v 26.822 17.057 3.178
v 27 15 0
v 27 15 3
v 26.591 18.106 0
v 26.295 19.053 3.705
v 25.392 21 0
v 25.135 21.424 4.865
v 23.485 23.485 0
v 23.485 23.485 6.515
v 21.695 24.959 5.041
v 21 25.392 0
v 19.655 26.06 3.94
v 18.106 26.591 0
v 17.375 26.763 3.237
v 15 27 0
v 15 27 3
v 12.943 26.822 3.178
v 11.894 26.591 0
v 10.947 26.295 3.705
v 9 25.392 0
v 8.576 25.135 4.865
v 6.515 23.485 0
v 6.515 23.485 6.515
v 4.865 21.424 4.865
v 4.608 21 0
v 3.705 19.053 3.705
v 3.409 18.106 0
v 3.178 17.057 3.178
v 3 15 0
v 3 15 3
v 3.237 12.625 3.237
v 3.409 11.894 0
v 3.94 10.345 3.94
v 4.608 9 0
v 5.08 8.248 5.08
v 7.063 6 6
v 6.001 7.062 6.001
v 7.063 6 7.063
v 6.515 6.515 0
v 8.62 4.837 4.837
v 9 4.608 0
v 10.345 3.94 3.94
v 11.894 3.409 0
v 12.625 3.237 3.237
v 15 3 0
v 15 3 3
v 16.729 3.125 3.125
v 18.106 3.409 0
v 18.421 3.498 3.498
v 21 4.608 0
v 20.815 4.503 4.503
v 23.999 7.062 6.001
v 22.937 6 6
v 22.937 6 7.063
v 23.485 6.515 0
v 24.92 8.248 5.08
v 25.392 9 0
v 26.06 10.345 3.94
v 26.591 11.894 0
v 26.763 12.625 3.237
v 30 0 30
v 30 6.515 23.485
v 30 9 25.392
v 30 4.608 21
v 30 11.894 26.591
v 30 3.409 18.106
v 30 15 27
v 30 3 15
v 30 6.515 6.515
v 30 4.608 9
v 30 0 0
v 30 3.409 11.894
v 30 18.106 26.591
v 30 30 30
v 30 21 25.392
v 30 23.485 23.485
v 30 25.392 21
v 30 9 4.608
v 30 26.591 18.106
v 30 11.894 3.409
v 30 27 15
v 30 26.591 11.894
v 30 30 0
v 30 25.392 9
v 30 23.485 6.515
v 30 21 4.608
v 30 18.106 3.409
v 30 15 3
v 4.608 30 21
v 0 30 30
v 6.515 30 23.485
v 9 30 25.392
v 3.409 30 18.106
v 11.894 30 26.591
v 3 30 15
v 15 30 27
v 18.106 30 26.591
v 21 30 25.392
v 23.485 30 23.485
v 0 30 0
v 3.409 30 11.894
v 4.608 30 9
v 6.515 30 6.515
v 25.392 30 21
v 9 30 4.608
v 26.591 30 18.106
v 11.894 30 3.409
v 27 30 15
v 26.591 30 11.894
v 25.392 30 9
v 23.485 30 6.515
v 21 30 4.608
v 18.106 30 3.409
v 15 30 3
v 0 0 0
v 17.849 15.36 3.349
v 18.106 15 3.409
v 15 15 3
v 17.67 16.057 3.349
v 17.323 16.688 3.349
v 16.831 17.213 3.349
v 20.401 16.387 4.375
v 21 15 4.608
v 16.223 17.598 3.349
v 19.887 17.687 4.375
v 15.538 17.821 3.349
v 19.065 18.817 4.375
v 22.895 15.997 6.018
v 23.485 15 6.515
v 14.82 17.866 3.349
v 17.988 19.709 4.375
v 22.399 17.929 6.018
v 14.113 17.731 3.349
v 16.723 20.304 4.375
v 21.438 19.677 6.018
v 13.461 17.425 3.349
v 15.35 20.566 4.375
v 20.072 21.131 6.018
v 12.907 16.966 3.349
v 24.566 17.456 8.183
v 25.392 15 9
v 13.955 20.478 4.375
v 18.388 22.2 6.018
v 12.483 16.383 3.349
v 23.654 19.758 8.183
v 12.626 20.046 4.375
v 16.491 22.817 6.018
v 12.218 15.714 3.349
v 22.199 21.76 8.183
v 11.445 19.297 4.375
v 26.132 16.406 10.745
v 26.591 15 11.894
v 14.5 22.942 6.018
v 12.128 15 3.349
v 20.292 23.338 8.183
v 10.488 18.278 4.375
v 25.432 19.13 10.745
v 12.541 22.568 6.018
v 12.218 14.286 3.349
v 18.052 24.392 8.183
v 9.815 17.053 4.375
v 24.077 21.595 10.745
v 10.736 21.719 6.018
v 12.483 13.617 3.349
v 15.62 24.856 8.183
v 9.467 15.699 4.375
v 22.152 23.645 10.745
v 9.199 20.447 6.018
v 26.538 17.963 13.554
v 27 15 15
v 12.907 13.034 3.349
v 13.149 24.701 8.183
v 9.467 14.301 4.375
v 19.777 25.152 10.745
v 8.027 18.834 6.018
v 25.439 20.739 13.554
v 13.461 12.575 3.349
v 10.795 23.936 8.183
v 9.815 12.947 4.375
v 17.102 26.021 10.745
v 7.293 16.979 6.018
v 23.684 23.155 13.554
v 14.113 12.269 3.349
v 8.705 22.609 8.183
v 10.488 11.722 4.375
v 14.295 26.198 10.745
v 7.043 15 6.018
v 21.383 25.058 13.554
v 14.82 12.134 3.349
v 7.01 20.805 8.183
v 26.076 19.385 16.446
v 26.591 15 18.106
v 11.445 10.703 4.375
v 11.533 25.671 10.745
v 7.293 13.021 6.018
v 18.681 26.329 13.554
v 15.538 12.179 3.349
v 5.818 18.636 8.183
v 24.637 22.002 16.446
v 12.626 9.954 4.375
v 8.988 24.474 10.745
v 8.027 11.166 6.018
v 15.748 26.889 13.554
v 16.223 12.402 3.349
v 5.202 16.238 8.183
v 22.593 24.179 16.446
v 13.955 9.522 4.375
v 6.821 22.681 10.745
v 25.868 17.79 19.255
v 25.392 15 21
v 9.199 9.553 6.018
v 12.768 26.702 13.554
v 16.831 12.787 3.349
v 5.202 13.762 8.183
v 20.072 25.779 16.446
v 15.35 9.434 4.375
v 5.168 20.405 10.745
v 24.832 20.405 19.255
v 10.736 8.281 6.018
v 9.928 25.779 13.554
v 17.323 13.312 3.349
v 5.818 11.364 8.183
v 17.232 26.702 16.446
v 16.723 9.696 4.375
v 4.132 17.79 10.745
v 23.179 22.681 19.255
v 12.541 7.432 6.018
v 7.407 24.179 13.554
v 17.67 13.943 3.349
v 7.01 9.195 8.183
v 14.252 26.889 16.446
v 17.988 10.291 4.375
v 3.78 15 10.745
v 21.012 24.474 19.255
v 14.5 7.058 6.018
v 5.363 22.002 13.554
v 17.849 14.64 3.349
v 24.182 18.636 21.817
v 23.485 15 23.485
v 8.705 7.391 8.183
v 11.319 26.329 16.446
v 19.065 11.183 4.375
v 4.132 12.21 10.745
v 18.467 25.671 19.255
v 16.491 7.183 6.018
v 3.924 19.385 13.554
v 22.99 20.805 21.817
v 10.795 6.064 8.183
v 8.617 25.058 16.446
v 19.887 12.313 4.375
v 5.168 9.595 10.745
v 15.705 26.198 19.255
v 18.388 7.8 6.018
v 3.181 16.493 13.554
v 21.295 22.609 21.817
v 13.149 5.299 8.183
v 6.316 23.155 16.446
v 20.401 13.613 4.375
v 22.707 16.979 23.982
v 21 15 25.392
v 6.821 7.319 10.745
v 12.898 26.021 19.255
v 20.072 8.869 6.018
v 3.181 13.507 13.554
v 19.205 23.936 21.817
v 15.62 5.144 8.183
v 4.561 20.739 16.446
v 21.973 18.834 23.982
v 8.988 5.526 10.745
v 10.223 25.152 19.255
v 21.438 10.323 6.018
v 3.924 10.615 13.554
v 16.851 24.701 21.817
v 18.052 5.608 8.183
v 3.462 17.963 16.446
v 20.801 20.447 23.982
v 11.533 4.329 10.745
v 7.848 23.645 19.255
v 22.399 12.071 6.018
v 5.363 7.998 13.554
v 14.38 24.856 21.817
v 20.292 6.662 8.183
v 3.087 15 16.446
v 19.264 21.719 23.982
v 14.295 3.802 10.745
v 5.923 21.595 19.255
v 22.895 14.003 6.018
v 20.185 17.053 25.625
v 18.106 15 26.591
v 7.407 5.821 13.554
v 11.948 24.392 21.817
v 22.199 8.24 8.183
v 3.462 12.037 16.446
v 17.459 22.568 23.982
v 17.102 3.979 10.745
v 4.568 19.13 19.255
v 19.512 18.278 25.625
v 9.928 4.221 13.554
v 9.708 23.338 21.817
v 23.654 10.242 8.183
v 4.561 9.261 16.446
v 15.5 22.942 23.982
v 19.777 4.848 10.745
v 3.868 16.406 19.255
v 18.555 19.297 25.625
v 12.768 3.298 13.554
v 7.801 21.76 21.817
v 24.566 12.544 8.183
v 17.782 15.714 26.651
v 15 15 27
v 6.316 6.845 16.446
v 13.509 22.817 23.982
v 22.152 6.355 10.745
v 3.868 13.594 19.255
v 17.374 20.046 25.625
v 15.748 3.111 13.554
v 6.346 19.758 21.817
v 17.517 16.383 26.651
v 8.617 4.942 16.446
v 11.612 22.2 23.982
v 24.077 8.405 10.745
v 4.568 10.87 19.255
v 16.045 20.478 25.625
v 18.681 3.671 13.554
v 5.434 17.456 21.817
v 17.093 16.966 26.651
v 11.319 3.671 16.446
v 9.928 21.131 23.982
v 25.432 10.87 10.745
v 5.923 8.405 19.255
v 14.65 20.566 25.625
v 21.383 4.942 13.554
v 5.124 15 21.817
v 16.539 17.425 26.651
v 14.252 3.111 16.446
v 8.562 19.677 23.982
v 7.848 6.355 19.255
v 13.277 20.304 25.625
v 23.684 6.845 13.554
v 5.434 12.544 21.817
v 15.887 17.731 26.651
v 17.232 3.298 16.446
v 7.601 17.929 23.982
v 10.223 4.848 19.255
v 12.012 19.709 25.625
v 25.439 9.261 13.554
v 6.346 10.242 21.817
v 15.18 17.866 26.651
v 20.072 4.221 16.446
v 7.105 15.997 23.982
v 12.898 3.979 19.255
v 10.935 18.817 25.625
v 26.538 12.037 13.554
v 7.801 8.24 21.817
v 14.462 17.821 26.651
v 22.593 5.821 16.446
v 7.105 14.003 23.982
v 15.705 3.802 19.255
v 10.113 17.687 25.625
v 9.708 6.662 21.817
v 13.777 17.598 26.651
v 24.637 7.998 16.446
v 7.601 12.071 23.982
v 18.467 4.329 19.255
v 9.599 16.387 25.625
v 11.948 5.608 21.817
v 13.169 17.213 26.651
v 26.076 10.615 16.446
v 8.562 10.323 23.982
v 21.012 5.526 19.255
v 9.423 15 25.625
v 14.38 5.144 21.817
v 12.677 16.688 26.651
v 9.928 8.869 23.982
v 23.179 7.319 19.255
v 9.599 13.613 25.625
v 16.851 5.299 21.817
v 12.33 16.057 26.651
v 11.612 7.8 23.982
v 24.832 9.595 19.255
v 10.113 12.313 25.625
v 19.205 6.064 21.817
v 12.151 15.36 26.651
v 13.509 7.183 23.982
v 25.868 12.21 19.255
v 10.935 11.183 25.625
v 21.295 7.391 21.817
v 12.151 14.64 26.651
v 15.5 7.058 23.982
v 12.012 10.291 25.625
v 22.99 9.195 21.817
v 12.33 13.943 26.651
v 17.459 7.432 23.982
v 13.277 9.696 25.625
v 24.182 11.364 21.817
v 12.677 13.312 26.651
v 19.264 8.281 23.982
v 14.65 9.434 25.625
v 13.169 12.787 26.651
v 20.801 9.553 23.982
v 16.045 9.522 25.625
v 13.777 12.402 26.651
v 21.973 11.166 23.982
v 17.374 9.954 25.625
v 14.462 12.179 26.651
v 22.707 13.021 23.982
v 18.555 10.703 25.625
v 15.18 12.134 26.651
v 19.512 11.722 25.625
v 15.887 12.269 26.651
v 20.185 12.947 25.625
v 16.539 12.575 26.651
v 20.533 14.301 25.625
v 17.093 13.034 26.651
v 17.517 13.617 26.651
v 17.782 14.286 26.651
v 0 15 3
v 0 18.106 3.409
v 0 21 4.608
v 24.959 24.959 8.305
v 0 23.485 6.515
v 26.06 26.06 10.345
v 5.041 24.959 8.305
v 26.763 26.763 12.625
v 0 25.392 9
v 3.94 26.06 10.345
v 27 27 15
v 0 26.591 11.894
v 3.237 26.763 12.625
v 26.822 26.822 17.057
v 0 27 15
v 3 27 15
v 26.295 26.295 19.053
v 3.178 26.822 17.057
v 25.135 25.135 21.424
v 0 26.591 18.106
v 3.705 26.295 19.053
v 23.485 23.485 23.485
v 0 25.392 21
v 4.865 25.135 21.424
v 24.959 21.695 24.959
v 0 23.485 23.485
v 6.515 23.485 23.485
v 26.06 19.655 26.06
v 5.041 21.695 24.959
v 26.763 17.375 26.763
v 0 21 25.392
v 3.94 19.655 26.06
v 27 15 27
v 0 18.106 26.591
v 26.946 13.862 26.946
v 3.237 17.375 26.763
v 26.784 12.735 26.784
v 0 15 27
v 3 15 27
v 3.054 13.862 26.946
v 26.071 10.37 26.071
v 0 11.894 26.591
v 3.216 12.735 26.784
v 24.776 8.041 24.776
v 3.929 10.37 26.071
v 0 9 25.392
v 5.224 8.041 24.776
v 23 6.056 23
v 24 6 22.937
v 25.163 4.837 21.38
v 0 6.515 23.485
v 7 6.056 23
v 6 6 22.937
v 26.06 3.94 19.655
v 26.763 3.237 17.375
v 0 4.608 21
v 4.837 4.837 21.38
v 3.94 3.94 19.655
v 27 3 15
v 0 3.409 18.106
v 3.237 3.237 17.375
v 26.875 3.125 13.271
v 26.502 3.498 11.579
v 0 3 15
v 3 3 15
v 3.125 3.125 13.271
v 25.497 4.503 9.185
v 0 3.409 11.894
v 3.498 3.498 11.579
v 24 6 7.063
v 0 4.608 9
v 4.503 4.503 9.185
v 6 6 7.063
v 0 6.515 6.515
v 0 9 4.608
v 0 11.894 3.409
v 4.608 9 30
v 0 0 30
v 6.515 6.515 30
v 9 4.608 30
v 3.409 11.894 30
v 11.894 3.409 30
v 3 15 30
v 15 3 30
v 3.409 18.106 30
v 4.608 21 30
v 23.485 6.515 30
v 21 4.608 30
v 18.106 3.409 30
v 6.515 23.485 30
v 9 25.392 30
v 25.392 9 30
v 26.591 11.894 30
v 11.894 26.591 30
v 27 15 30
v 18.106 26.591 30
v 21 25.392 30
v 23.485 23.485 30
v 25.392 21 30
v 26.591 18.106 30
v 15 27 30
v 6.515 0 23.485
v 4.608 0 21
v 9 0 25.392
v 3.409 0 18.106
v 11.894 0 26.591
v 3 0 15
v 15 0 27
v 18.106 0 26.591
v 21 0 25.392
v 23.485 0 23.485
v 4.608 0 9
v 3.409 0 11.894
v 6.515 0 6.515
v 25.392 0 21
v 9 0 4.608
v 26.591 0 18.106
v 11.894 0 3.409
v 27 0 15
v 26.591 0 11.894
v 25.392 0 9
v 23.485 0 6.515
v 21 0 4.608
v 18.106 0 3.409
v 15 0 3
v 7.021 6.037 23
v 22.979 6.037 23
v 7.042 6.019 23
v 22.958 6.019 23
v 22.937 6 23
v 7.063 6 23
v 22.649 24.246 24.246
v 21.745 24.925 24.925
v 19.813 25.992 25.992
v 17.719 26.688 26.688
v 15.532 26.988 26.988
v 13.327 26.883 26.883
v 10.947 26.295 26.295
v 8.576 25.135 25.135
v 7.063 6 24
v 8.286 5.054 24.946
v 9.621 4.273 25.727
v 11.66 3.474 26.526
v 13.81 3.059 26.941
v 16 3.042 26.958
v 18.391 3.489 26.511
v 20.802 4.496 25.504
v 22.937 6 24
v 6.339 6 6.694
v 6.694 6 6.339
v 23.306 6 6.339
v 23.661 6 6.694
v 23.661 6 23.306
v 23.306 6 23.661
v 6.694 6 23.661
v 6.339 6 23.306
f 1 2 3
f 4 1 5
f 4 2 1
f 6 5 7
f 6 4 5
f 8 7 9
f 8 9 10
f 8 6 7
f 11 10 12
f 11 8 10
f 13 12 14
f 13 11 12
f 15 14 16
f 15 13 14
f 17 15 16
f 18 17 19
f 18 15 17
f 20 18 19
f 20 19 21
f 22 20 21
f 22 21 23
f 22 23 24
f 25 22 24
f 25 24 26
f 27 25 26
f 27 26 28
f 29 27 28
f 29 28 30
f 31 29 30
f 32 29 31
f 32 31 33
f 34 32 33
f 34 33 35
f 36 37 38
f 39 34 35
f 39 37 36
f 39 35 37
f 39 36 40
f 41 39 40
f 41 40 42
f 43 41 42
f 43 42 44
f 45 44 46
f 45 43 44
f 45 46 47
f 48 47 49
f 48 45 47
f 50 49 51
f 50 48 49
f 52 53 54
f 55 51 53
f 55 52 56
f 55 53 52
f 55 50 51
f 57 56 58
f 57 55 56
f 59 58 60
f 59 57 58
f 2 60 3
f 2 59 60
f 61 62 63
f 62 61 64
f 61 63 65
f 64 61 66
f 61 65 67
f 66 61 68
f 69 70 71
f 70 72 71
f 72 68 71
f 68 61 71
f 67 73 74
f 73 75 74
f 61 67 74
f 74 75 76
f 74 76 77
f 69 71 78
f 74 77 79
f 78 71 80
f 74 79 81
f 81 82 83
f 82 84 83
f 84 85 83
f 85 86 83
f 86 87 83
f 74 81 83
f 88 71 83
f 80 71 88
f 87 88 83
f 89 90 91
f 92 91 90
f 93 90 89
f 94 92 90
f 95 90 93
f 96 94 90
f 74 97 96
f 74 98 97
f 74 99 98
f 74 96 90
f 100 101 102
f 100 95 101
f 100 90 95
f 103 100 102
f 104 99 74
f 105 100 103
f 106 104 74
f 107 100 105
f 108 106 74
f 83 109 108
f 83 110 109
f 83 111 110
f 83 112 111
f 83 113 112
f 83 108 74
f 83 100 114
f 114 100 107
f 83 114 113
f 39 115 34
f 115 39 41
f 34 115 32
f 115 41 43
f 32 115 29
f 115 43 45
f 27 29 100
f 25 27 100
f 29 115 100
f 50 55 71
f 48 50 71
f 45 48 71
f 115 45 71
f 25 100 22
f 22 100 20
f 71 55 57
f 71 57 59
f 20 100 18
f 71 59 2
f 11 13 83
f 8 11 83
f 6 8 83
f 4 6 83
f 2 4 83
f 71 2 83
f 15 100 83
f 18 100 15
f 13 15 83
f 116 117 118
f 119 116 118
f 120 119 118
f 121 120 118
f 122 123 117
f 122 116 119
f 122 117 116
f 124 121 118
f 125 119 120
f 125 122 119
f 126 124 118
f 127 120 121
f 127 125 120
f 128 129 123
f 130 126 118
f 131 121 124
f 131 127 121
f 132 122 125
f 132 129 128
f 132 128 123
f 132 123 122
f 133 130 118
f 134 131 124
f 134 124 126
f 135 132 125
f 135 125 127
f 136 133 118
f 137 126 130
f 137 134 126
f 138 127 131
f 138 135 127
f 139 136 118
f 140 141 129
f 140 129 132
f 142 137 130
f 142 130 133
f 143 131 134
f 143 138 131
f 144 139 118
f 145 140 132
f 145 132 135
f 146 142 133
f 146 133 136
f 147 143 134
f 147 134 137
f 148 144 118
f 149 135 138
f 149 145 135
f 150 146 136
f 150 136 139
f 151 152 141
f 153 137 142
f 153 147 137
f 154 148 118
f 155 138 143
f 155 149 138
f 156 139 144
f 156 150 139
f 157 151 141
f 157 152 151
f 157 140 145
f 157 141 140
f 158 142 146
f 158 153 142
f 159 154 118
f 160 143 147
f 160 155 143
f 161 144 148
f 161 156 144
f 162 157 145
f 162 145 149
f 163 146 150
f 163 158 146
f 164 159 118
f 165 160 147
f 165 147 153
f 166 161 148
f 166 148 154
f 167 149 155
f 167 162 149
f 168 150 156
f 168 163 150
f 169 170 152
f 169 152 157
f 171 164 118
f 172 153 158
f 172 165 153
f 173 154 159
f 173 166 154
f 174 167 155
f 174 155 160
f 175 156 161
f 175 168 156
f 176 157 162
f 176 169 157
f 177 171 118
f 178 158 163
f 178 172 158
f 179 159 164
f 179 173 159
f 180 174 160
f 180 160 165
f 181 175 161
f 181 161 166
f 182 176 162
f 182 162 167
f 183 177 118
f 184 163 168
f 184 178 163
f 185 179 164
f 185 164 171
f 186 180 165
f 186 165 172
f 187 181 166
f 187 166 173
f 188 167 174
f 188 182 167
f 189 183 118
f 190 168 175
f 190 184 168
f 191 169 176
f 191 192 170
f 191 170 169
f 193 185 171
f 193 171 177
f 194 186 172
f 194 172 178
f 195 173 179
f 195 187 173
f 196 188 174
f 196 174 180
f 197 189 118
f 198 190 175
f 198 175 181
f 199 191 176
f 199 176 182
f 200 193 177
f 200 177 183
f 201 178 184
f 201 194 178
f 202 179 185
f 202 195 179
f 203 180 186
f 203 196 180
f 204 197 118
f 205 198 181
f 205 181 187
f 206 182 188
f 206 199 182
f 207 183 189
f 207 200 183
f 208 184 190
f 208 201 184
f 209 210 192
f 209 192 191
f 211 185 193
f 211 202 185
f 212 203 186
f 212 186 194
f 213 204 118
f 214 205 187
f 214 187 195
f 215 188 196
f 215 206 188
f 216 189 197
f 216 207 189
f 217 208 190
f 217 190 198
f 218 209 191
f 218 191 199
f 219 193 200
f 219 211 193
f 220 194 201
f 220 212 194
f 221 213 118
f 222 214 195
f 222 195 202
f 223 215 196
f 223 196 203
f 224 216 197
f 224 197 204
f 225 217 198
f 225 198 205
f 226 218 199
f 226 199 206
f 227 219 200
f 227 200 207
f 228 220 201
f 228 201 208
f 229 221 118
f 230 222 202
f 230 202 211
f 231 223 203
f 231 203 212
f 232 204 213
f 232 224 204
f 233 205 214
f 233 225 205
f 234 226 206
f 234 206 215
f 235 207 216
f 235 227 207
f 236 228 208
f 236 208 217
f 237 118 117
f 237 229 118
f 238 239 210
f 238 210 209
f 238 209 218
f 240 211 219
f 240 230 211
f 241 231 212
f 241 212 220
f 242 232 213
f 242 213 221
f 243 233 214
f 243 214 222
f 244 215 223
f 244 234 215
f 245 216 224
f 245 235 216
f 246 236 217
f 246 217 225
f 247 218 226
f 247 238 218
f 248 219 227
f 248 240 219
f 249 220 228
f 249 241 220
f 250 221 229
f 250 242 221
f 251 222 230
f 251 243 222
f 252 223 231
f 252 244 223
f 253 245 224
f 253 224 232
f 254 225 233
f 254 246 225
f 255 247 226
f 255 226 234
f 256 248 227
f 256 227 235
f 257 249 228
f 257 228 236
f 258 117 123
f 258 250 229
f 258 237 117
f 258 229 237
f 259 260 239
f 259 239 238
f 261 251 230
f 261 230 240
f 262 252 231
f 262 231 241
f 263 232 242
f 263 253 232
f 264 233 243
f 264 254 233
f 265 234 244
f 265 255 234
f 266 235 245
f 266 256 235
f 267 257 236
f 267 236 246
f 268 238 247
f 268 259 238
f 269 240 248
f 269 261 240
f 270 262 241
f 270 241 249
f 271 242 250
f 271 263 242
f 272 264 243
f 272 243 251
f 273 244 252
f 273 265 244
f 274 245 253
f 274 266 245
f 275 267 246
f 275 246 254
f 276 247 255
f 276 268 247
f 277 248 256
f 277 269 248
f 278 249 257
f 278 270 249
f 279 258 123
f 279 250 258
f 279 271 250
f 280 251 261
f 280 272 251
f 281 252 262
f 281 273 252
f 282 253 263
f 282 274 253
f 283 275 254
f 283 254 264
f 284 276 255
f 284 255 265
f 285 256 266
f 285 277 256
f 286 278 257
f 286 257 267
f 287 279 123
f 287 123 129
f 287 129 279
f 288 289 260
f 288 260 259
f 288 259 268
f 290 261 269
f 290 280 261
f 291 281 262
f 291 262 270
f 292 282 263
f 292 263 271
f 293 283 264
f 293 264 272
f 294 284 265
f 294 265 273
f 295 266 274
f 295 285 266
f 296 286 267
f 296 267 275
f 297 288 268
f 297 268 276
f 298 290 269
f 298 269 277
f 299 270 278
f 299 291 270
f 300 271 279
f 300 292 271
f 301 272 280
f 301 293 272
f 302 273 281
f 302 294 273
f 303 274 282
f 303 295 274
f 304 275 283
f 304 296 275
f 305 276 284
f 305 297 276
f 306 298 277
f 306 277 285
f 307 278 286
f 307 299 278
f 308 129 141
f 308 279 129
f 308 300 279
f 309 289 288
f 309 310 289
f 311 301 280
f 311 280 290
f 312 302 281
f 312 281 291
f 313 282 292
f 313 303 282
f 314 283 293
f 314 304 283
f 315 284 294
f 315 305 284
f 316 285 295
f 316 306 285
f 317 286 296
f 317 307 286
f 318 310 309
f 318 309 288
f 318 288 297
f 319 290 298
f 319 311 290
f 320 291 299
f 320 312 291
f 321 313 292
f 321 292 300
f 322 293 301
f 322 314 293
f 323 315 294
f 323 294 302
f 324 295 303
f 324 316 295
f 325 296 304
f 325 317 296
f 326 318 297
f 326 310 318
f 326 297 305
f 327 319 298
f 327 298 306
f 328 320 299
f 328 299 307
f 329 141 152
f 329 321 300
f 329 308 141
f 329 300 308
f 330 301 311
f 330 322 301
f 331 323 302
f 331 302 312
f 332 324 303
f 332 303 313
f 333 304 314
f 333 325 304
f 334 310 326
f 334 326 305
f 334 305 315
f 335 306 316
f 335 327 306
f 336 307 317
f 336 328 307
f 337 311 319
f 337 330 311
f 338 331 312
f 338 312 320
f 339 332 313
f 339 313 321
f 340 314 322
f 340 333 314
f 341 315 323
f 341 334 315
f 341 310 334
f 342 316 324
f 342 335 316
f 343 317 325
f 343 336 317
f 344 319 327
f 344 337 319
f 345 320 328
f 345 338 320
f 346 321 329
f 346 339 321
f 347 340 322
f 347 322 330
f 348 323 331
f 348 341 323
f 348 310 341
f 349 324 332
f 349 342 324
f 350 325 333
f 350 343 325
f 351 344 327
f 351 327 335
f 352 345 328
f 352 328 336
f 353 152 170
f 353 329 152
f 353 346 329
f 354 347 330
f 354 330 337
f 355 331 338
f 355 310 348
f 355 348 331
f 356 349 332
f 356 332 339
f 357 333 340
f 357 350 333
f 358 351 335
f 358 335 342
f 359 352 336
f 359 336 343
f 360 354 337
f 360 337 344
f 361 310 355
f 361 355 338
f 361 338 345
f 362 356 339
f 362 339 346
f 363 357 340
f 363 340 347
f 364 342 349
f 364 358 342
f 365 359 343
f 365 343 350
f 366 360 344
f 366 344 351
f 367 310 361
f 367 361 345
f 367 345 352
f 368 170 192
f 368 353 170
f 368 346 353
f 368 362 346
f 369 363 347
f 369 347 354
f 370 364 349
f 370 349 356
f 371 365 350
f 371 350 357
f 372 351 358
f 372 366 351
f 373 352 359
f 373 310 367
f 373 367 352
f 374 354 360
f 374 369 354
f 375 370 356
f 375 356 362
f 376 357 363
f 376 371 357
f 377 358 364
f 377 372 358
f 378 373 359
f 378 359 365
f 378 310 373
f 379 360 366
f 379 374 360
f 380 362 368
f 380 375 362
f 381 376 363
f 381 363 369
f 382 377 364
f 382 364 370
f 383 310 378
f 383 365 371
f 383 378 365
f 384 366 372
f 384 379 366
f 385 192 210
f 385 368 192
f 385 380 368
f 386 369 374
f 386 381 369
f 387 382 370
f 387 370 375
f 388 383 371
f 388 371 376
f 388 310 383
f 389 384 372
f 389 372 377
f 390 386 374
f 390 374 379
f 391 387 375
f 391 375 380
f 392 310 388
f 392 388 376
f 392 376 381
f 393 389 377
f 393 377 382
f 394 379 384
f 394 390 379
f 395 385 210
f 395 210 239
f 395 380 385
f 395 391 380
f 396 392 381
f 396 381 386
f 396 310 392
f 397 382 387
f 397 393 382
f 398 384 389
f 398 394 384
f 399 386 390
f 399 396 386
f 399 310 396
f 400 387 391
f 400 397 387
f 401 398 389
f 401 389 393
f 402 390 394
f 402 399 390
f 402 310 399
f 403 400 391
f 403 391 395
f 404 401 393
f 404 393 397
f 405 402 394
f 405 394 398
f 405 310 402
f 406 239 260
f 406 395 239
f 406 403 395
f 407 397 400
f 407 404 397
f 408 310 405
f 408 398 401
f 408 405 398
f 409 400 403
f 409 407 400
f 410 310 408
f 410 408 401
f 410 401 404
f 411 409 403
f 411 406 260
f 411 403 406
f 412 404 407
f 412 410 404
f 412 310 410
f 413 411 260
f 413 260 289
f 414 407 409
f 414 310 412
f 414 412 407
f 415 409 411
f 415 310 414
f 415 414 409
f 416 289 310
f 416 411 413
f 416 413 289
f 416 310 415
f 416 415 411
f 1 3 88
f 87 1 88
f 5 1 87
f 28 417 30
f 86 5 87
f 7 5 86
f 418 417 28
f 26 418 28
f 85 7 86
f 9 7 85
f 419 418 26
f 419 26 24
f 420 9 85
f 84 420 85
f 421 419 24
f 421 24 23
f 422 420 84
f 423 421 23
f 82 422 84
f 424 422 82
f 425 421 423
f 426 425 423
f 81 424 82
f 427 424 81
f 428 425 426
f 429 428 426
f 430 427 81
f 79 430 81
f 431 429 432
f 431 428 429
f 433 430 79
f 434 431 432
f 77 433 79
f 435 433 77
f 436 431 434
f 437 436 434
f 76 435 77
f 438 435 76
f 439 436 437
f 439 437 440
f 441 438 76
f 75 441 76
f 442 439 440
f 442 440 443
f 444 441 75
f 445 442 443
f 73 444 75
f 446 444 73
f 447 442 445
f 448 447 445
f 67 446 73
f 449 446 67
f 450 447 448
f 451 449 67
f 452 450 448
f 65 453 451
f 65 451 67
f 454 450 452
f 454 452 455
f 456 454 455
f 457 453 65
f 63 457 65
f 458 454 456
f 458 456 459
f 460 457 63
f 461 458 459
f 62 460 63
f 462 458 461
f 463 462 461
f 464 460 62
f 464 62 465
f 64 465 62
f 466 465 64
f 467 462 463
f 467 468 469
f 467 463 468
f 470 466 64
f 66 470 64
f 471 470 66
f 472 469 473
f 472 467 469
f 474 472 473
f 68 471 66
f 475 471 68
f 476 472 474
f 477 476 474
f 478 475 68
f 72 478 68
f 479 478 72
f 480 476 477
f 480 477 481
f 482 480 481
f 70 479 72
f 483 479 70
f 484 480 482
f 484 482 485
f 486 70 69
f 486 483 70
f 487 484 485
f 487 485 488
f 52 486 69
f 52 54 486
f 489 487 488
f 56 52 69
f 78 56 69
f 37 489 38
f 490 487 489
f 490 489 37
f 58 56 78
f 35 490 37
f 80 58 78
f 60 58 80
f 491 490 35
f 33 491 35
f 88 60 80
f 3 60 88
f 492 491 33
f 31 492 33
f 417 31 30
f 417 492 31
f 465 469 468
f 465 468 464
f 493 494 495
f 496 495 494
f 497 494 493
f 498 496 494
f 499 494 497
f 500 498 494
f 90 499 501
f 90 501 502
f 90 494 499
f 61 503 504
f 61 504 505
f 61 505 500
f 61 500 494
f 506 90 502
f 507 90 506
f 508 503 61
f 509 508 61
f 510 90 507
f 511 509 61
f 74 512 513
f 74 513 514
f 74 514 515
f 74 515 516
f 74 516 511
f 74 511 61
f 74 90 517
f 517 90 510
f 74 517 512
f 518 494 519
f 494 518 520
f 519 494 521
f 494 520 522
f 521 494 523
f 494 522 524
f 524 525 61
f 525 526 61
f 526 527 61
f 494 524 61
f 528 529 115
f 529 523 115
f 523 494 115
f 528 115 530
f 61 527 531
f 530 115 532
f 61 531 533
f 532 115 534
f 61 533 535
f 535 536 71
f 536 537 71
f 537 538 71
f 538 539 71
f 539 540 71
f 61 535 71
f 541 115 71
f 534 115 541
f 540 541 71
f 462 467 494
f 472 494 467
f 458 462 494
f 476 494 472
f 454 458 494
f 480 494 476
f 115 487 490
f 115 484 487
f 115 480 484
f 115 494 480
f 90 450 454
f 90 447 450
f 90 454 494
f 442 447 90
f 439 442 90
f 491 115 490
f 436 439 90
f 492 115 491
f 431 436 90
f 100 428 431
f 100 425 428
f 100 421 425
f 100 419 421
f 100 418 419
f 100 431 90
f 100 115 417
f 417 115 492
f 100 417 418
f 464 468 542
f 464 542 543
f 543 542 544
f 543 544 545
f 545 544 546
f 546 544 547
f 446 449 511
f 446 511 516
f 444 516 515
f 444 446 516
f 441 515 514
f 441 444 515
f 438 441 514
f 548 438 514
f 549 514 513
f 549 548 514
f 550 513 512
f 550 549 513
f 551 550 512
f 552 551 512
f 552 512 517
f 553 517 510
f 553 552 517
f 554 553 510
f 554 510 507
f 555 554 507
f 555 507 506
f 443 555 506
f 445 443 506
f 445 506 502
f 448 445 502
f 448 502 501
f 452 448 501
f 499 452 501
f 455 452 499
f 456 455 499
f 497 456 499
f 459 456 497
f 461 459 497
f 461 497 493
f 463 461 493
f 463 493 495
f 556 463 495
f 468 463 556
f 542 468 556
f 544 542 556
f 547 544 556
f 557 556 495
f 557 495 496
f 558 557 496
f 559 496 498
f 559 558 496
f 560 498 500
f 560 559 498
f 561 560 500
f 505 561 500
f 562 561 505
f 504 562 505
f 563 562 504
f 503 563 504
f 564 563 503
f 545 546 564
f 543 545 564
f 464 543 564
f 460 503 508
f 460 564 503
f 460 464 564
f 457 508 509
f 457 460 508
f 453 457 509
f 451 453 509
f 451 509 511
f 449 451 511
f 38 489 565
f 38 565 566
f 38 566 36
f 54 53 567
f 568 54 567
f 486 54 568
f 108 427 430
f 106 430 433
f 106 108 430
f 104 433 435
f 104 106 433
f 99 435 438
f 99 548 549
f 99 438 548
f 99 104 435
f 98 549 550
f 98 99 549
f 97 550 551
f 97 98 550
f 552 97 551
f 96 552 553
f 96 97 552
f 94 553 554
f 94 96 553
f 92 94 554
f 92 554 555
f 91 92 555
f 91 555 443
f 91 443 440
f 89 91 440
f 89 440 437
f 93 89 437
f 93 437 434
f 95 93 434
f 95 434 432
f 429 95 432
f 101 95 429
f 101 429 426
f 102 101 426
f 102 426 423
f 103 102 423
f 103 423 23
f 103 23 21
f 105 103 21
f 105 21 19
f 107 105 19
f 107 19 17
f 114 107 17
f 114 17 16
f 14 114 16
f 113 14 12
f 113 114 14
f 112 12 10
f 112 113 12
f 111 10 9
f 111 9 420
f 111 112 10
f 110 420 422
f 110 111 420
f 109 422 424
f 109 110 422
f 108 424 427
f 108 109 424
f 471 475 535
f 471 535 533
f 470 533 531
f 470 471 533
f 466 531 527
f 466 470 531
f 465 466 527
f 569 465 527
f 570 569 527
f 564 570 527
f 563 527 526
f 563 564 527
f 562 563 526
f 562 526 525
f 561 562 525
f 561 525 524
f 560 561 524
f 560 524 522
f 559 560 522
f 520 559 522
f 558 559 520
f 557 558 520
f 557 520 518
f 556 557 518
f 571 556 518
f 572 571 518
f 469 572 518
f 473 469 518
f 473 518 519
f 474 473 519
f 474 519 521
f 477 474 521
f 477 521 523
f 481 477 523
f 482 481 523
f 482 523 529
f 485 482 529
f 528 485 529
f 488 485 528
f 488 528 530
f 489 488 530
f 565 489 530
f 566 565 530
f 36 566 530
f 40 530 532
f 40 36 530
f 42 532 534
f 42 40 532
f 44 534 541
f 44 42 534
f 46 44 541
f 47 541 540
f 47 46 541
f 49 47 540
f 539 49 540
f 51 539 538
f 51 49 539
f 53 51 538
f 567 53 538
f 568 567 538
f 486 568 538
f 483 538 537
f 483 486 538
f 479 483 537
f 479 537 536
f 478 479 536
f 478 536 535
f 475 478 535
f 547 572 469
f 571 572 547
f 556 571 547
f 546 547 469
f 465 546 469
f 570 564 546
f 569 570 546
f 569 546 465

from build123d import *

# Parameters (mm, degrees)
CYLINDER001_R     = 12
CYLINDER001_DEPTH = 30
CYLINDER002_R     = 12
CYLINDER002_DEPTH = 20
CYLINDER003_R     = 12
CYLINDER003_DEPTH = 20
CYLINDER004_R     = 12
CYLINDER004_DEPTH = 20
CYLINDER005_R     = 12
CYLINDER005_DEPTH = 20
CYLINDER_R        = 12
CYLINDER_DEPTH    = 20
BOX_W             = 30
BOX_H             = 30
BOX_DEPTH         = 30


with BuildPart() as cylinder001:
    # Cylinder001 → Cylinder001 (new body)
    with BuildSketch(Plane(origin=(-4, 15, 15), x_dir=(0, 0, -1), z_dir=(1, 0, 0))):
        Circle(CYLINDER001_R)
    extrude(amount=CYLINDER001_DEPTH)


with BuildPart() as cylinder002:
    # Cylinder002 → Cylinder002 (new body)
    with BuildSketch(Plane(origin=(15, 15, 23), x_dir=(1, 0, 0), z_dir=(0, 0, 1))):
        Circle(CYLINDER002_R)
    extrude(amount=CYLINDER002_DEPTH)


with BuildPart() as cylinder003:
    # Cylinder003 → Cylinder003 (new body)
    with BuildSketch(Plane(origin=(15, 15, -3), x_dir=(1, 0, 0), z_dir=(0, 0, 1))):
        Circle(CYLINDER003_R)
    extrude(amount=CYLINDER003_DEPTH)


with BuildPart() as cylinder004:
    # Cylinder004 → Cylinder004 (new body)
    with BuildSketch(Plane(origin=(15, 6, 15), x_dir=(1, 0, 0), z_dir=(0, -1, 0))):
        Circle(CYLINDER004_R)
    extrude(amount=CYLINDER004_DEPTH)


with BuildPart() as cylinder005:
    # Cylinder005 → Cylinder005 (new body)
    with BuildSketch(Plane(origin=(15, 34, 15), x_dir=(1, 0, 0), z_dir=(0, -1, 0))):
        Circle(CYLINDER005_R)
    extrude(amount=CYLINDER005_DEPTH)


with BuildPart() as fusion:
    # Cylinder → Cylinder (new body)
    with BuildSketch(Plane(origin=(24, 15, 15), x_dir=(0, 0, -1), z_dir=(1, 0, 0))):
        Circle(CYLINDER_R)
    extrude(amount=CYLINDER_DEPTH)

    # Fusion: union Cylinder001, Cylinder002, Cylinder003, Cylinder004, Cylinder005
    add(cylinder001.part)
    add(cylinder002.part)
    add(cylinder003.part)
    add(cylinder004.part)
    add(cylinder005.part)


with BuildPart() as cut:
    # Box → Box (new body)
    with BuildSketch(Plane.XY):
        with Locations((15, 15)):
            Rectangle(BOX_W, BOX_H)
    extrude(amount=BOX_DEPTH)

    # Cut: cut Fusion
    add(fusion.part, mode=Mode.SUBTRACT)


with BuildPart() as sphere:
    # Sphere → Sphere (revolve)
    with BuildSketch(Plane(origin=(15, 15, 15), x_dir=(1, 0, 0), z_dir=(0, -1, 0))):
        with BuildLine():
            ThreePointArc((0, -12), (12, 0), (0, 12))
            Line((0, 12), (0, -12))
        make_face()
    revolve(axis=Axis((15, 15, 15), (0, 0, 1)))


solid = Compound([cut.part, sphere.part])
